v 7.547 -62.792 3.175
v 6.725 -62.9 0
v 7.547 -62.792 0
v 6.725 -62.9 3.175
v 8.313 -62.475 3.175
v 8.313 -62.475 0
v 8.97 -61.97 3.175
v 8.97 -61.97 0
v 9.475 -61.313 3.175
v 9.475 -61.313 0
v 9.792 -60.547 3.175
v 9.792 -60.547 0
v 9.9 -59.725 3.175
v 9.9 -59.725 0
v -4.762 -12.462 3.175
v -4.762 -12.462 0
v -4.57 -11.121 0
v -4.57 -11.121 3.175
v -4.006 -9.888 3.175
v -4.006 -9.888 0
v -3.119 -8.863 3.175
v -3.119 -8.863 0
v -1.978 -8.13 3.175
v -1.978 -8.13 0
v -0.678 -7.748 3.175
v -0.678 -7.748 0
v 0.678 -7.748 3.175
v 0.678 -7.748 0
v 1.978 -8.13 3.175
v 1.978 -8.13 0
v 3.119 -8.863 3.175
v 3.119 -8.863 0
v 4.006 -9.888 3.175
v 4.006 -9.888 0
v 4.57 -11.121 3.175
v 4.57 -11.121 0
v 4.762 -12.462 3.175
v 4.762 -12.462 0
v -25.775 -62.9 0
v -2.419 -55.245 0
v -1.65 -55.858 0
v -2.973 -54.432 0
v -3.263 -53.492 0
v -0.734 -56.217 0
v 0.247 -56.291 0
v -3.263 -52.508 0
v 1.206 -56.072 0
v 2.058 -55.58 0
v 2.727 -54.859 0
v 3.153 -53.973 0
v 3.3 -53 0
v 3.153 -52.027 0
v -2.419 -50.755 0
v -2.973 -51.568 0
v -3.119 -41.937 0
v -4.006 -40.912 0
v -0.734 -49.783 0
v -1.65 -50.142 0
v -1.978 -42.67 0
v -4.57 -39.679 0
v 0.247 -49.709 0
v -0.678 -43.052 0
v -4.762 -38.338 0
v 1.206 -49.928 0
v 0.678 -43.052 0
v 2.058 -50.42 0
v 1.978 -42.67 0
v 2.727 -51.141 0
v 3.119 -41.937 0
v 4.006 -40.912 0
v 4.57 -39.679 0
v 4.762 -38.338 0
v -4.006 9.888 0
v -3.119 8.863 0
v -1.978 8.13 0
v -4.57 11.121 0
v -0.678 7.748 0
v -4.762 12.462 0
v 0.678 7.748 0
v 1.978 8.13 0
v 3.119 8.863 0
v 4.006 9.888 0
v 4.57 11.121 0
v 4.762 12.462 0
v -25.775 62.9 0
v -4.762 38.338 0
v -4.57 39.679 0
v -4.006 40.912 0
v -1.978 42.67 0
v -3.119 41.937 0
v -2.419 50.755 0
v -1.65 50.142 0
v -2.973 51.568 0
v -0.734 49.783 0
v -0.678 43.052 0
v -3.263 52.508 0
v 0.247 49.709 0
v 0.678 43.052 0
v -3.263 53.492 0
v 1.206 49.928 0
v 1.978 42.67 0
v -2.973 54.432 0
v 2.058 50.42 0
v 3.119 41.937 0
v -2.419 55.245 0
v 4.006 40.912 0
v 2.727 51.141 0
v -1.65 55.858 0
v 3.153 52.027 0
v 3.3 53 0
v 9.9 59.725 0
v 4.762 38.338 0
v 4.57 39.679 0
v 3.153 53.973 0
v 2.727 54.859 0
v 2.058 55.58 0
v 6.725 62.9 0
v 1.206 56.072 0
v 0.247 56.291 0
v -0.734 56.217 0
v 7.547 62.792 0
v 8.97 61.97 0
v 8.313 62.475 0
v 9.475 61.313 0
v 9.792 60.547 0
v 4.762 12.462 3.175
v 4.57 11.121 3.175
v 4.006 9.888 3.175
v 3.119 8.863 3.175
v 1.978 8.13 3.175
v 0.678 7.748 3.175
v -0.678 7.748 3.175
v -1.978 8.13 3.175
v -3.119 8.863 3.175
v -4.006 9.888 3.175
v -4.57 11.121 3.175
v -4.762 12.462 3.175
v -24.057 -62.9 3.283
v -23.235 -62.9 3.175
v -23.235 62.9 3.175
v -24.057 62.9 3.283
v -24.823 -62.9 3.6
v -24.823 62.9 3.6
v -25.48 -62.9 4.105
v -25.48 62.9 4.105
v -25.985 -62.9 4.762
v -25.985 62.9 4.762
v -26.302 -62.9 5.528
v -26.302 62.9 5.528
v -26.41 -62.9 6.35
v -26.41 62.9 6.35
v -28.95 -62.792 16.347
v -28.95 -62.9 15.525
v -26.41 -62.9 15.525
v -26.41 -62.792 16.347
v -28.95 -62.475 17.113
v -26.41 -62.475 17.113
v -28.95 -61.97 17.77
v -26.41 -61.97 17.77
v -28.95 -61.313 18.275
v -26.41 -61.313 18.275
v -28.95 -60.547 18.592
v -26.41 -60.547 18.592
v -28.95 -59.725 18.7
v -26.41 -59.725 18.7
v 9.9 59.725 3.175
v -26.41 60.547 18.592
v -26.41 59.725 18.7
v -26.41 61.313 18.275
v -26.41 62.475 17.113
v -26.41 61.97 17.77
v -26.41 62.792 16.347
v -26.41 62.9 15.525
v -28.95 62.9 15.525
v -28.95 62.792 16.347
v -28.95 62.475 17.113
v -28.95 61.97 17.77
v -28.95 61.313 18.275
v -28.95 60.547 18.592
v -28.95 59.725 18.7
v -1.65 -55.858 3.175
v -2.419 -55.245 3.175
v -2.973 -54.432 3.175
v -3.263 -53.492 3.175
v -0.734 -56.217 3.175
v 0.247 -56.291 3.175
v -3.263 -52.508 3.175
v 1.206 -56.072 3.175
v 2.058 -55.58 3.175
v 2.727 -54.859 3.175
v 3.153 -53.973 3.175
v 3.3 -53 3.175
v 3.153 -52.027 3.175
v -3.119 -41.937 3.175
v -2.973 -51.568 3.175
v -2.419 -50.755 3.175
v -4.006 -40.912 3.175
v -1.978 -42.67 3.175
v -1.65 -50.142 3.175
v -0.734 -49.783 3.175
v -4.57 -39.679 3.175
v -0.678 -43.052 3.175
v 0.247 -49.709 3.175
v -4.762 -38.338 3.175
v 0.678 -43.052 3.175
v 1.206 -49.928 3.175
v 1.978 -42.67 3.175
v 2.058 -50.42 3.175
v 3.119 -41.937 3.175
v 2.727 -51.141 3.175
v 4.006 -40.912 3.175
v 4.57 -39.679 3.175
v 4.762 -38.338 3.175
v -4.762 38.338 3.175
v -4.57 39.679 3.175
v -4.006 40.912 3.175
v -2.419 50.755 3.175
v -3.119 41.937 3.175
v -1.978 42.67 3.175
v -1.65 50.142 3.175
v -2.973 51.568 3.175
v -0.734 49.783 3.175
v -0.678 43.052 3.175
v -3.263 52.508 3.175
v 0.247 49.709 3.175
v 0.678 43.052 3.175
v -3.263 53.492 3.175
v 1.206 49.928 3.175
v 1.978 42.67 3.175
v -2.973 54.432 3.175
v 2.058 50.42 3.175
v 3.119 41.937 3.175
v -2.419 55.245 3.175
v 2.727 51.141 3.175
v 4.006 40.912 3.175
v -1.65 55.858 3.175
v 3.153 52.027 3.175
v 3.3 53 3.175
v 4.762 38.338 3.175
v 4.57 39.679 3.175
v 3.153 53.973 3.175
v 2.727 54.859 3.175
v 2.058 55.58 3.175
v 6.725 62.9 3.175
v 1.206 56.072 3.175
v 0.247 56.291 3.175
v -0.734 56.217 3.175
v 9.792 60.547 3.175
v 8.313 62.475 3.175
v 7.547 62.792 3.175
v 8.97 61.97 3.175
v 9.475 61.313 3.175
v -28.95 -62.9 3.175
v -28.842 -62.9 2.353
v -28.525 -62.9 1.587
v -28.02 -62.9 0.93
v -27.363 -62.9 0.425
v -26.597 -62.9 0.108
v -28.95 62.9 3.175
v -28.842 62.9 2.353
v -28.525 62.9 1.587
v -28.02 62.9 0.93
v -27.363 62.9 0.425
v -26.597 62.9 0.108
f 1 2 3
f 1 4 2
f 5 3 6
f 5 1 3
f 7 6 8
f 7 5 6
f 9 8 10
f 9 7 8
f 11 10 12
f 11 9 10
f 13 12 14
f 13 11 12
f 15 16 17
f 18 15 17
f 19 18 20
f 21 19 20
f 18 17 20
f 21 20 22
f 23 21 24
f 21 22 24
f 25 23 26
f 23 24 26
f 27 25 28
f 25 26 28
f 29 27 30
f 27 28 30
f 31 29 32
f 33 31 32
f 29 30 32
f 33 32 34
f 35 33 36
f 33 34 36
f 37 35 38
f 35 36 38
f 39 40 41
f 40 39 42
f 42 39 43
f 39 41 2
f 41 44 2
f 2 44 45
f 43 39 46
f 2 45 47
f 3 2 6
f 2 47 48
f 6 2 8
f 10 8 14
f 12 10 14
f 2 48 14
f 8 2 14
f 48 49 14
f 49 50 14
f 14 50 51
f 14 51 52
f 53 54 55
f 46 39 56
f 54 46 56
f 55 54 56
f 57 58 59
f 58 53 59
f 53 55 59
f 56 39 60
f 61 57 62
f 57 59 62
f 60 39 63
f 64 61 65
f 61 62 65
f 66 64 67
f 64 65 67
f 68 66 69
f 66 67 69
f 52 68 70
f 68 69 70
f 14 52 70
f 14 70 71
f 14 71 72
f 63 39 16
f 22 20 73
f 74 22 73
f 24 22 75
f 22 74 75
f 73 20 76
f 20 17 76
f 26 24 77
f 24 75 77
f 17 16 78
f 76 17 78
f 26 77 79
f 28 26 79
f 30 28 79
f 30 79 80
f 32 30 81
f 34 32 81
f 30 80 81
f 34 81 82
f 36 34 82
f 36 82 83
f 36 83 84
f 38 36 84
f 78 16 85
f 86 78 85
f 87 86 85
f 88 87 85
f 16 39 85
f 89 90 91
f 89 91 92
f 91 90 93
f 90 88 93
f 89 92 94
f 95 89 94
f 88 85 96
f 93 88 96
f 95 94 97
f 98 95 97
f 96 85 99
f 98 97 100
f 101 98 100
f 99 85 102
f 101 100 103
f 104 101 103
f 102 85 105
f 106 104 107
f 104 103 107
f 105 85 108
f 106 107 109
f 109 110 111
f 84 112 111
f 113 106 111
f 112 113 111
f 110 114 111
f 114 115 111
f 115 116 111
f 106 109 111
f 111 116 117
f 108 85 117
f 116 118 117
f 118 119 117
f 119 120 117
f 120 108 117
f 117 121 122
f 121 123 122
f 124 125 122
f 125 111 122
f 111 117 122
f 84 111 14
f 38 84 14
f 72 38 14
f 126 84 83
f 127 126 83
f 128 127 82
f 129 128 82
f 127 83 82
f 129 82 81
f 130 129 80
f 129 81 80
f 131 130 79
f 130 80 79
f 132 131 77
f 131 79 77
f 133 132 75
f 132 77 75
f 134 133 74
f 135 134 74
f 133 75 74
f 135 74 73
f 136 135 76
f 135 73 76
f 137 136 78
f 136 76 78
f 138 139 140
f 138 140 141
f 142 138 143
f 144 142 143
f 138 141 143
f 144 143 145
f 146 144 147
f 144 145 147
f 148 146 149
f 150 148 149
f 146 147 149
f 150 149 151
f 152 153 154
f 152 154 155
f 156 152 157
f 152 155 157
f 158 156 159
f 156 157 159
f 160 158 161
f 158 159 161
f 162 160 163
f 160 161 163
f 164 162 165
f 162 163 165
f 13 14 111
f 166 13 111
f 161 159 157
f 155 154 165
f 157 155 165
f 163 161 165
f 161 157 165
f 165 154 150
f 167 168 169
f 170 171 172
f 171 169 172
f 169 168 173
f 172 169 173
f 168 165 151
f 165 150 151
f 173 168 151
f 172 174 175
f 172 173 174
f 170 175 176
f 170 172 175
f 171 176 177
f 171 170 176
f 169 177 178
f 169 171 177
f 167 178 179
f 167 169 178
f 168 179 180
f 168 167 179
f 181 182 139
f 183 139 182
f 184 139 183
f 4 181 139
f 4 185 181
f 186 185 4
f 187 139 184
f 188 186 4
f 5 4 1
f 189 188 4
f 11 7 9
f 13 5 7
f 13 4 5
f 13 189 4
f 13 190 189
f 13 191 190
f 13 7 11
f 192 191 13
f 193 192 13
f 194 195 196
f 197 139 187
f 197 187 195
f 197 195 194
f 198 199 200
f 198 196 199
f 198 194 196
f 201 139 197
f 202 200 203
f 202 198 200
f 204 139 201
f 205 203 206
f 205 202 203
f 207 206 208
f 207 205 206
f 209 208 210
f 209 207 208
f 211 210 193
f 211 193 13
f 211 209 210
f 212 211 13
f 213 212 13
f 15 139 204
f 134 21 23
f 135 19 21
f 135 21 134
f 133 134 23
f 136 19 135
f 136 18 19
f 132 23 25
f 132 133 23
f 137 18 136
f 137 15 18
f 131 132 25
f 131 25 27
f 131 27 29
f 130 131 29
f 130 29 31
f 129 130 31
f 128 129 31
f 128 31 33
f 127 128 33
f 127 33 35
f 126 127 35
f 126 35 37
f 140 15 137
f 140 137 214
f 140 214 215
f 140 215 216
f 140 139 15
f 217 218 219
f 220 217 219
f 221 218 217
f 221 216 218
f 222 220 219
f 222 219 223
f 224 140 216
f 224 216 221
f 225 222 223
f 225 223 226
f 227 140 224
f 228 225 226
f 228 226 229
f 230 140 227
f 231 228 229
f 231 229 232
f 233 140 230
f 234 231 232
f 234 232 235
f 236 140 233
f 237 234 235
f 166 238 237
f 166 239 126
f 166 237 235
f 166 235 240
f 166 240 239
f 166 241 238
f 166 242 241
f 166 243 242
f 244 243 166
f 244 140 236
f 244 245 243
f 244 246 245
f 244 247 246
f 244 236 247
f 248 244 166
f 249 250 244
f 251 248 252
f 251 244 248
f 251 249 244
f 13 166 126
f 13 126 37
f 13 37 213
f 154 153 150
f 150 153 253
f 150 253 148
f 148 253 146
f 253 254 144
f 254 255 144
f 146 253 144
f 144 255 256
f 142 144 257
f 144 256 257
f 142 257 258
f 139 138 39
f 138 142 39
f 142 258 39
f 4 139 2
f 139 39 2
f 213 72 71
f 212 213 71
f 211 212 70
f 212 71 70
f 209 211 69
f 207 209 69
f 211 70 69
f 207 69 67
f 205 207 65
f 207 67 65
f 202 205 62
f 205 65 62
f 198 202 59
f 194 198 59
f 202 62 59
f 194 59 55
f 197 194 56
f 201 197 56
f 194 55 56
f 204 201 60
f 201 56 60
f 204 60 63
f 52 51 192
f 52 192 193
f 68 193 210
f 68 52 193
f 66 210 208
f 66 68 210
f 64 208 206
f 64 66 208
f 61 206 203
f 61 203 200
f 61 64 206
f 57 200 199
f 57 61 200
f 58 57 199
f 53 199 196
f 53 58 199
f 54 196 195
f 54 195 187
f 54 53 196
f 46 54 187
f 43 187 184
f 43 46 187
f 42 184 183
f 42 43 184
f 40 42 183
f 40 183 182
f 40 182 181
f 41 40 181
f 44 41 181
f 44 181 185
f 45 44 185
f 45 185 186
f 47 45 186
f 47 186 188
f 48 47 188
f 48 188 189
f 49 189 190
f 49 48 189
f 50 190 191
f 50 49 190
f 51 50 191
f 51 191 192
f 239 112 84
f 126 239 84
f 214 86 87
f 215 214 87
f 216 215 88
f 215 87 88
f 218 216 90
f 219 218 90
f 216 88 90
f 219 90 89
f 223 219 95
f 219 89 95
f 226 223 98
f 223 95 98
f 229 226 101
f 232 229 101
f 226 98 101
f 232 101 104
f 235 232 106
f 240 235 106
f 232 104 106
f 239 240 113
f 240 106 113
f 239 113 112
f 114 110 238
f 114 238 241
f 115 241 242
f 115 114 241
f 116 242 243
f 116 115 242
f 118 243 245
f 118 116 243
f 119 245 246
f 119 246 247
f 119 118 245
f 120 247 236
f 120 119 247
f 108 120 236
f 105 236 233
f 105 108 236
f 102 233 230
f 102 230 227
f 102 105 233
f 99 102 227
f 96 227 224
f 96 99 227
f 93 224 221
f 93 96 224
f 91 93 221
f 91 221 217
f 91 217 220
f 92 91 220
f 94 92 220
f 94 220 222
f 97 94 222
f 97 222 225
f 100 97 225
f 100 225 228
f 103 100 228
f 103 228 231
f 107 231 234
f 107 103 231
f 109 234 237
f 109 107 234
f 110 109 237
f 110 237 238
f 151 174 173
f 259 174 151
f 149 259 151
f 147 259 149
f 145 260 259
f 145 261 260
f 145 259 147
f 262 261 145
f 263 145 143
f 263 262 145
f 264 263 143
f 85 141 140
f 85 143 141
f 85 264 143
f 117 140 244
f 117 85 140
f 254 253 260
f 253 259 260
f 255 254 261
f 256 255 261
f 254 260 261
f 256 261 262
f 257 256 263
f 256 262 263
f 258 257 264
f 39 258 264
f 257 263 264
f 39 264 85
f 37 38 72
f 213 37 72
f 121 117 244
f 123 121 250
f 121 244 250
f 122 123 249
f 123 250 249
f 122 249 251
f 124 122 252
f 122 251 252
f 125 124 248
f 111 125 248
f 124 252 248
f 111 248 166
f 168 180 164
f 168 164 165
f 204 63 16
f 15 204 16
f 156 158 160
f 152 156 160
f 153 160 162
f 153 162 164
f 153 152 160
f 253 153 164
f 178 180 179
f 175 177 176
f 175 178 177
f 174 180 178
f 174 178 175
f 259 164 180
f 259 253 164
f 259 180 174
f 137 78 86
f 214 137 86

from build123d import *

# Parameters (mm, degrees)
SKETCH1_W               = 19.800000024
SKETCH1_H               = 125.800000114
SKETCH1_R               = 3.3
SKETCH1_W_2             = 19.05
BOSS_EXTRUDE1_DEPTH     = 3.175
CUT_EXTRUDE1_DEPTH      = 70.315172458
CUT_EXTRUDE1_DEPTH_BACK = 70.315172458
FILLET1_R               = 3.175
SKETCH7_W               = 2.54
SKETCH7_H               = 125.800000114
EXTRUDE_THIN1_DEPTH     = 15.525155132
FILLET2_R               = 3.175


with BuildPart() as part:
    # Sketch1 → Boss-Extrude1 (new body)
    # profile 1 of 2: a face of its own
    with BuildSketch(Plane.XY):
        Rectangle(SKETCH1_W, SKETCH1_H)
        with Locations((0, -53.000000045)):
            Circle(SKETCH1_R, mode=Mode.SUBTRACT)
        with Locations((0, 53.000000045)):
            Circle(SKETCH1_R, mode=Mode.SUBTRACT)
    # profile 2 of 2: a face of its own
    with BuildSketch(Plane.XY):
        with Locations((-19.425000012, 0)):
            Rectangle(SKETCH1_W_2, SKETCH1_H)
    extrude(amount=BOSS_EXTRUDE1_DEPTH)

    # Sketch6 → Cut-Extrude1 (cut, two sides: drawn at the far end of the back side and taken through both)
    with BuildSketch(Plane.XY.offset(3.175).offset(-CUT_EXTRUDE1_DEPTH_BACK)):
        with BuildLine():
            Line((4.7625, 38.337500033), (4.7625, 12.462499967))
            ThreePointArc((4.7625, 12.462499967), (0, 7.699999967), (-4.7625, 12.462499967))
            Line((-4.7625, 12.462499967), (-4.7625, 38.337500033))
            ThreePointArc((-4.7625, 38.337500033), (0, 43.100000033), (4.7625, 38.337500033))
        make_face()
        with BuildLine():
            Line((4.7625, -12.462499967), (4.7625, -38.337500033))
            ThreePointArc((4.7625, -38.337500033), (0, -43.100000033), (-4.7625, -38.337500033))
            Line((-4.7625, -38.337500033), (-4.7625, -12.462499967))
            ThreePointArc((-4.7625, -12.462499967), (0, -7.699999967), (4.7625, -12.462499967))
        make_face()
    extrude(amount=CUT_EXTRUDE1_DEPTH + CUT_EXTRUDE1_DEPTH_BACK, mode=Mode.SUBTRACT)

    # Fillet1
    fillet1_edges = [part.edges().sort_by_distance(p)[0] for p in [
        (9.900000012, 62.900000057, 1.5875),
        (9.900000012, -62.900000057, 1.5875),
    ]]
    fillet(fillet1_edges, radius=FILLET1_R)

    # Sketch7 → Extrude-Thin1 (add)
    with BuildSketch(Plane.XY.offset(3.175)):
        with Locations((-27.680000012, 0)):
            Rectangle(SKETCH7_W, SKETCH7_H)
    extrude(amount=EXTRUDE_THIN1_DEPTH)

    # Fillet2
    fillet2_edges = [part.edges().sort_by_distance(p)[0] for p in [
        (-27.680000012, -62.900000057, 18.700155132),
        (-27.680000012, 62.900000057, 18.700155132),
        (-26.410000012, 0, 3.175),
        (-28.950000012, 0, 0),
    ]]
    fillet(fillet2_edges, radius=FILLET2_R)


solid = part.part
